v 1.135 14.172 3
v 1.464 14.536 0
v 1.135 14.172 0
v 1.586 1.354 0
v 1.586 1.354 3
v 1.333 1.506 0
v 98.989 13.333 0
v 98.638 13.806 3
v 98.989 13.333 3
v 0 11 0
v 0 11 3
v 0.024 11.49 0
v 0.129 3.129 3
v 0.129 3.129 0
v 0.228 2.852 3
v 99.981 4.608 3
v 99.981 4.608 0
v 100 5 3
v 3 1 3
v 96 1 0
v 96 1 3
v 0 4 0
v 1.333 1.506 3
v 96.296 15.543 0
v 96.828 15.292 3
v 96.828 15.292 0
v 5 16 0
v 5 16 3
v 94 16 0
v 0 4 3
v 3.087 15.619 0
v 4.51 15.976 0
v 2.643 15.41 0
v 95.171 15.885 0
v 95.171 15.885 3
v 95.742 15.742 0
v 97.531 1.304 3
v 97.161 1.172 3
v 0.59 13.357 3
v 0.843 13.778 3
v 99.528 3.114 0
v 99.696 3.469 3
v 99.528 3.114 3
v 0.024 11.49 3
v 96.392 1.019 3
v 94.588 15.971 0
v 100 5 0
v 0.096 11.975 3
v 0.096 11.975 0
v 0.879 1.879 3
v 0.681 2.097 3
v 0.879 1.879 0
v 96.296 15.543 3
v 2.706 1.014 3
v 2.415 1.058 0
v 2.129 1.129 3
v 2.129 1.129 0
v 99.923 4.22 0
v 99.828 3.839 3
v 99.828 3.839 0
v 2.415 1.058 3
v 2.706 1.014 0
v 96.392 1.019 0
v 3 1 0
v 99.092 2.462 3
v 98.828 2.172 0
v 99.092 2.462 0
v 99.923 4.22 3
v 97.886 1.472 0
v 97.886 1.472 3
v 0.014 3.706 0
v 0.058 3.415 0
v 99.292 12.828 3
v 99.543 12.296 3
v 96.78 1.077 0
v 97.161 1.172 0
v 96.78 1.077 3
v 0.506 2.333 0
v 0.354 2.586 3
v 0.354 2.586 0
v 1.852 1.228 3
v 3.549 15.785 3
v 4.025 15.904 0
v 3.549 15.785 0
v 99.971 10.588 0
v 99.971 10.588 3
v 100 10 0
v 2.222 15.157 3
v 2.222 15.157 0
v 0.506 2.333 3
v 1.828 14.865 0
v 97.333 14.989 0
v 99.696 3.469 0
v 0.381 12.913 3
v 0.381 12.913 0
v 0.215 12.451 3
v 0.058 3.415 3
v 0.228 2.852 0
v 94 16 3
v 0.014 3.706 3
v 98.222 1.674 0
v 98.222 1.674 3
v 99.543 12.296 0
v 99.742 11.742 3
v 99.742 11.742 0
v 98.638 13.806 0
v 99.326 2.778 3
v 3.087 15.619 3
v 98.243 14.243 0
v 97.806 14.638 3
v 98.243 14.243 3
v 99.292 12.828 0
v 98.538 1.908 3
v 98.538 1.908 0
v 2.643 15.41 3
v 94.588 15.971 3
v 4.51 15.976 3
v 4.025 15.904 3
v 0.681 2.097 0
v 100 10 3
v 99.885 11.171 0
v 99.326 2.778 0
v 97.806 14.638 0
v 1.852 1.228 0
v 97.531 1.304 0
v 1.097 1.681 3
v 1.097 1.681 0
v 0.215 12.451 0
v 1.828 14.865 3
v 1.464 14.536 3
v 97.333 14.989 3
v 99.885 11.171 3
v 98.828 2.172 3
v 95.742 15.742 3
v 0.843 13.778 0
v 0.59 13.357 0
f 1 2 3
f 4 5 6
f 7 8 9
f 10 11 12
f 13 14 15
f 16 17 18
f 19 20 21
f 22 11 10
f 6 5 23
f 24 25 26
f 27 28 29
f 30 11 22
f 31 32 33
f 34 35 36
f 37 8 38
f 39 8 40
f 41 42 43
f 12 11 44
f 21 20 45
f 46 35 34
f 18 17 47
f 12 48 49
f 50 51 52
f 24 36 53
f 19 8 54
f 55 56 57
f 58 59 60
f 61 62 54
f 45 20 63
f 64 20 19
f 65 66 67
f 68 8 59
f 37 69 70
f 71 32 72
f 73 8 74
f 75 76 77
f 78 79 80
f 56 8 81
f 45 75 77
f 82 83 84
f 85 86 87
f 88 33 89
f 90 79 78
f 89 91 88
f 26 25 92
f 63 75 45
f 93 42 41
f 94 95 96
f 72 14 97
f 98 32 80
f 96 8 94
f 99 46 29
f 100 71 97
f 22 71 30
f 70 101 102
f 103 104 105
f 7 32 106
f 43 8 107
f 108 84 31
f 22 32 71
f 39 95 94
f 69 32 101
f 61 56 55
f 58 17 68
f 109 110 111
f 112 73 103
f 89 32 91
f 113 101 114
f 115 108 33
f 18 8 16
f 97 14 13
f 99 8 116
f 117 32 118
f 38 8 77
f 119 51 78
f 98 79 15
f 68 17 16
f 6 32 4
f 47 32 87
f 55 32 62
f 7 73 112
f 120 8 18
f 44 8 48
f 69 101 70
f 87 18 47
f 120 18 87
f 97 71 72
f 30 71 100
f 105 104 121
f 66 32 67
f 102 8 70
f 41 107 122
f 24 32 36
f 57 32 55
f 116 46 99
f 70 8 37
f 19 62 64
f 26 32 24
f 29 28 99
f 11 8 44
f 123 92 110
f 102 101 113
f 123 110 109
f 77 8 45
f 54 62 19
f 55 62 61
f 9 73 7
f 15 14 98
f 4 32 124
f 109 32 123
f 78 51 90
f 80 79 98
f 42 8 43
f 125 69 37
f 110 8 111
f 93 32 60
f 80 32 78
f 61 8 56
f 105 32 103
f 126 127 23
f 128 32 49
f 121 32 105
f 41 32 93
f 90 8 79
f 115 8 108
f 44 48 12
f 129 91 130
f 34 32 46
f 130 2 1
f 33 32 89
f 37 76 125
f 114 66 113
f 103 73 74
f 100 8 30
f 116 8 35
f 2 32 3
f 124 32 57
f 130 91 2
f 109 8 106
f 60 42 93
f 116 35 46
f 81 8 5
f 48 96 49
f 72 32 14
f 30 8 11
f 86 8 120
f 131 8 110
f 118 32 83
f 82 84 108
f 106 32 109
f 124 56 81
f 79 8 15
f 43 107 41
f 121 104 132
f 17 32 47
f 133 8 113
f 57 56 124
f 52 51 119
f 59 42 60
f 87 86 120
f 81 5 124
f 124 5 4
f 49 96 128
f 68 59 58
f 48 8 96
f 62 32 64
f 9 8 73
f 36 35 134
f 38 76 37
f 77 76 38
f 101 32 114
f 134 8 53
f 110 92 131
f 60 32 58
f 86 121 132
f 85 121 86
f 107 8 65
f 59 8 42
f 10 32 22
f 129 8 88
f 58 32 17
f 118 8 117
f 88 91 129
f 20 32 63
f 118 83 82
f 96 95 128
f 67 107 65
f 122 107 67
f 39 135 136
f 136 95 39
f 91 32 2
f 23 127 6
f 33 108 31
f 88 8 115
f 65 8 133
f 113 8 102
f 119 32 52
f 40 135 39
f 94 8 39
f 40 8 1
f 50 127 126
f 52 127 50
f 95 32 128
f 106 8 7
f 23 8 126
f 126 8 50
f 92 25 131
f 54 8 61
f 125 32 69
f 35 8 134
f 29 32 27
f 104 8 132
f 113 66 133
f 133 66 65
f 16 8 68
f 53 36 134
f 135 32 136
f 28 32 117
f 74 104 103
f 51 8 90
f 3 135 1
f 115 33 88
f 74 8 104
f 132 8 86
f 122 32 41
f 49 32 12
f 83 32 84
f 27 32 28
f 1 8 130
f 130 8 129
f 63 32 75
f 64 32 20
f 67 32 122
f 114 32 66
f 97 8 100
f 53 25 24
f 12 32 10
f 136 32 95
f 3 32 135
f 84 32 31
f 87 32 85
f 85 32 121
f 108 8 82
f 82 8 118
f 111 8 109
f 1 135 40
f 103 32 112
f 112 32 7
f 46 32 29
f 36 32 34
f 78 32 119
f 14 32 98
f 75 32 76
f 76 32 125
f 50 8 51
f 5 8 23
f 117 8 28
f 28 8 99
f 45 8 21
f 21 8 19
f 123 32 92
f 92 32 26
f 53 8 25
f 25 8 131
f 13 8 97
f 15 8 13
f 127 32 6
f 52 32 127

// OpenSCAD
// file: modules/Modules.scad
/*
	This program is free software: you can redistribute it and/or modify
	it under the terms of the GNU General Public License as published by
	the Free Software Foundation, either version 3 of the License, or
	(at your option) any later version.

	This program is distributed in the hope that it will be useful,
	but WITHOUT ANY WARRANTY; without even the implied warranty of
	MERCHANTABILITY or FITNESS FOR A PARTICULAR PURPOSE.  See the
	GNU General Public License for more details.
	
	Purpose:  Hold general use modules for to simplify making of objects
	
	History:	
		01/25/2024	Initial creation
		02/17/2025	Added modules for roundedCube, roundedCylinder
								and FilletedCylinder
		02/23/2025	refactored filletedCylinder to include tapered cylinders
								reference filletedCylinderV1 to see original

*/

/***********************************************************************
****** Module - screwHole
	Create a hole specifically for a screw to go in.
***********************************************************************/
//screwHole();
module screwHole(screwHole=4.5, screwDepth = 10, screwHead = 9, headTaper = 2.3, screwHeadDepth = 5, s=$fn){
	$fn = s;
	// Common size screws
	
    translate([0,0,-headTaper])cylinder(d1=screwHole, d2=screwHead, h = headTaper, $fn=20);
    translate([0,0,-headTaper-screwDepth])cylinder(d=screwHole, h=screwDepth, $fn=10);
    translate([0,0,-headTaper-screwDepth])cylinder(d=screwHole, h=screwDepth, $fn=10);
    translate([0,0,0]) cylinder(d=screwHead, h=screwHeadDepth, $fn=10);
}

/***********************************************************************
****** Module - roundedCube
	4 various ways to make a cube with soft rounded sides.
***********************************************************************/
//roundedCube(x=50, y=30, z=20, r=5, xyz="x");
//roundedCube(x=50, y=30, z=20, r=5, xyz="y");
//roundedCube(x=50, y=30, z=20, r=5, xyz="z");
//roundedCube(x=50, y=30, z=20, r=5, xyz="all");
//roundedCube(x=50, y=30, z=20, r=5, xyz="all", s=60);
//roundedCube(x=50, y=30, z=20, r=5, xyz="all", s=$fn);
module roundedCube(x=50, y=30, z=20, r=5, xyz="z", s=$fn){
	/* variable definitions
			x = value for x axis
			y = value for y axis
			z = value for z axis
			r = radius
			xyz = axis to have the sides rounded
	*/
	$fn = s;
	hull(){
		if (xyz == "z") {
			translate([r,r,0])cylinder(h=z, r=r);
			translate([x-r,r,0])cylinder(h=z, r=r);
			translate([r,y-r,0])cylinder(h=z, r=r);
			translate([x-r,y-r,0])cylinder(h=z, r=r);
		} else if (xyz == "y") {
			translate([r,0,r])rotate([-90,0,0])cylinder(h=y, r=r);
			translate([x-r,0,r])rotate([-90,0,0])cylinder(h=y, r=r);
			translate([r,0,z-r])rotate([-90,0,0])cylinder(h=y, r=r);
			translate([x-r,0,z-r])rotate([-90,0,0])cylinder(h=y, r=r);
		} else if (xyz == "x") {
			translate([0,r,r])rotate([0,90,0])cylinder(h=x, r=r);
			translate([0,y-r,r])rotate([0,90,0])cylinder(h=x, r=r);
			translate([0,r,z-r])rotate([0,90,0])cylinder(h=x, r=r);
			translate([0,y-r,z-r])rotate([0,90,0])cylinder(h=x, r=r);
		} else if (xyz == "all") {
			minkowski(){
				translate([r,r,r])cube([x-r*2,y-r*2,z-r*2]);
				sphere(r=r);
			}			
		} else { 
			echo("XYZ not set");
		}
	}
}

/***********************************************************************
******* Module - roundedCylinder
	Create a cylinder with nice rounded outter top and bottom
***********************************************************************/
//roundedCylinder();
//roundedCylinder(d=200, h=100, r=5);
//roundedCylinder(td=100, bd=100, tr= 10, br = .1);
//difference(){roundedCylinder(d=20, h=10, r=1, s=60);filletedCylinder(d=5, h=10, tr=2, br=1, pad=0, s=30);}
module roundedCylinder(d=200, td=0, bd=0, h=100, r=5, tr=0, br=0, s=$fn){
	$fn = s;

	// Calulate for one or two radises
	tRad = tr > 0 ? tr : r;
	bRad = br > 0 ? br : r;
	//echo(tRad, bRad);

	// Calculate for one diamater or two.
	tDia = td > 0 ? td : d;
	bDia = bd > 0 ? bd : d;
	//echo(tDia, bDia);

	hull(){
		//Bottom
		translate([0,0,bRad])rotate_extrude()translate([bDia/2-bRad,0,0])circle(r=bRad);
		//Top
		translate([0,0,h-tRad])rotate_extrude()translate([tDia/2-tRad,0,0])circle(r=tRad);
	}
}

/***********************************************************************
******* Module - filletedCylinder
	Create a cylinder with flared top and/or bottoms.
	Used for making rounded top/bottom holes in objects.
	Usage:
		d = diamater
		td = top diamater.  d will be used if not provided
		dd = bottom diamater.  d will be used if not provided
		h = height
		r = radius of the fillet
		tr = top radius.  r will be used if not provided
		br = bottom radius.  r will be used if not provided
		pad = filler around the radius  5 is usually good unless very small
		s = smoothing.  generally let $fn of the object do the work.
***********************************************************************/
//filletedCylinder();
//filletedCylinder(d=50, h=100, r=5, pad=5, s=$fn);
//filletedCylinder(d=10, h=20, tr=1, br=1, pad=.1, s=60);
//difference(){roundedCylinder();filletedCylinder();}
//difference(){roundedCylinder(d=200, h=100, r=5);filletedCylinder(d=50, h=100, tr=10, br=5, pad=5);}
//difference(){roundedCylinder(d=20, h=10, r=1, s=30);filletedCylinder(d=5, h=10, tr=2, br=1, pad=0, s=30);}
//filletedCylinder(d=50, td=20, bd=60, h=100, tr=10, br=5, pad=5, s=$fn);
//difference(){roundedCylinder(s=60);filletedCylinder(d=50, td=50, bd=20, h=100, tr=10, br=5, pad=5, s=$fn);}
module filletedCylinder(d=50, td=0, bd=0, h=100, tr=0, br=0, r=5, pad=5, s=$fn){
	$fn = s;
	shift = .1;

	// Calulate for one or two radises
	tRad = tr > 0 ? tr : r;
	bRad = br > 0 ? br : r;
	//echo(tRad, bRad);

	// Calculate for one diamater or two.
	tDia = td > 0 ? td : d;
	bDia = bd > 0 ? bd : d;
	//echo(tDia, bDia);

	// Calculate the shift of the radius in due to angle of a cone
  trShift = tDia > bDia ? tRad * tan(atan(((tDia/2)-(bDia/2))/h)) : 0;
	brShift = bDia > tDia ? bRad * tan(atan(((bDia/2)-(tDia/2))/h)) : 0;
	//echo(trShift, brShift);

	translate([0,0,-shift])cylinder(h=h+shift*2, r1=bDia/2, r2=tDia/2);
	if ( bRad > 0 ){
		// bottom
		translate([0,0,-shift])
			difference(){
				rotate_extrude()translate([bDia/2-pad-brShift,0,0])square([bRad+pad, bRad]);
				rotate_extrude()translate([bDia/2+bRad-brShift,bRad,0])circle(r=bRad);
			}
	}
	if ( tRad > 0 ){
		// top
		translate([0,0,h-tRad+shift])
			difference(){
				rotate_extrude()translate([tDia/2-pad-trShift,0,0])square([tRad+pad, tRad]);
				rotate_extrude()translate([tDia/2+tRad-trShift,0,0])circle(r=tRad);
			}
	}
}

		// v1 kept for reference.  No longer used
		// module filletedCylinderV1(d=50, h=100, tr=10, br=5, pad=5, s=$fn){
		// 	$fn = s;
		// 	shift = .1;
		// 	translate([0,0,-shift])cylinder(h=h+shift*2, r=d/2);
		// 	if ( br > 0 ){
		// 		// bottom
		// 		translate([0,0,-shift])
		// 			difference(){
		// 				rotate_extrude()translate([d/2-pad,0,0])square([br+pad, br]);
		// 				rotate_extrude()translate([d/2+br,br,0])circle(r=br);
		// 			}
		// 	}
		// 	if ( tr > 0 ){
		// 		// top
		// 		translate([0,0,h-tr+shift])
		// 			difference(){
		// 				rotate_extrude()translate([d/2-pad,0,0])square([tr+pad, tr]);
		// 				rotate_extrude()translate([d/2+tr,0,0])circle(r=tr);
		// 			}
		// 	}
		// }

/***********************************************************************
******* Module - CylinderFillet
	Fillet the outter circumfrence of a cylinder.
***********************************************************************/
//difference(){cylinder(h=20, d=100);cylinderFillet(d = 100, r=5);}
/*difference(){
	cylinder(h=20, d=100);
	cylinderFillet(d = 100, r=5);
	translate([0,0,20])rotate([180,0,0])cylinderFillet(d = 100, r=5, s=60);
}*/
module cylinderFillet(d = 100, r=5, s=$fn){
		$fn = s;
		pad = 0.1;	// Padding to maintain manifold
		translate([0,0,0])
		difference() {
				rotate_extrude(convexity=10)
						translate([d/2-r+pad,-pad,0])
								square(r+pad,r+pad);
				#rotate_extrude(convexity=10)
						translate([d/2-r,r,0])
								circle(r=r);
		}
}
// main file
/*
	This program is free software: you can redistribute it and/or modify
	it under the terms of the GNU General Public License as published by
	the Free Software Foundation, either version 3 of the License, or
	(at your option) any later version.

	This program is distributed in the hope that it will be useful,
	but WITHOUT ANY WARRANTY; without even the implied warranty of
	MERCHANTABILITY or FITNESS FOR A PARTICULAR PURPOSE.  See the
	GNU General Public License for more details.
	
	Purpose:  Create nice caulk bead and do it in tight spaces.
	GitHub:		
	
	History:	
		11/10/2025	Initial creation

	Notes:
		- Nothing special see inline notes below

*/

/****** Variables ******************************************************
***********************************************************************/
radius1 = 3;						//
radius2 = 4;						//
radius3 = 5;						//
radius4 = 6;						//
objHeight = 100;
objWidth = 16;
objThick = 3;

// Special variables
$fn = $preview ? 32 : 64;		// 0 is OpenSCAD default

/****** Imports & Includes & Calculations ******************************
***********************************************************************/
include <modules/Modules.scad>

// Global Calculations


/****** The Object *****************************************************
***********************************************************************/
object(objHeight, objWidth, objThick, radius1, radius2, radius3, radius4);

module object(x,y, z, r1, r2, r3, r4){
	// Rendered Calculations
	
	// Start creating the object
	
	hull(){
		translate([r1,r2,0])cylinder(h=z, r=r1);
		translate([x-r2,r3,0])cylinder(h=z, r=r2);
		translate([r3,y-r3,0])cylinder(h=z, r=r3);
		translate([x-r4,y-r4,0])cylinder(h=z, r=r4);
	}
}

/*Some basic commands
translate([0,0,0])
rotate([0,0,0])
cube([0,0,0]);
difference(){}
*/



/****** Batch Export***************************************************
	Use this module to create multiple exports based on rerenderd values
	https://github.com/bbaumg/3DPrinter/blob/master/export.py
	<modules/export.py>
	
	This script searches for "module export()" and individually renders
	and exports each item in it. Each item is expected to be on its own line. 
	The file name will be the comment on the same line, or the module 
	call if no comment exists. All files will be put in a folder with 
	the same name as the scad file it's created from.
***********************************************************************/
module export() {
	//objectExport(x); //<filename.stl>
}

// Calls this to make minor tweaks for batch rendering
//   e.g. rotation of the object for best viewing
module objectExport(var1){
	echo("Rendering Export");
	// Allows for rotation of object for best orientation of STL file
	//    Likely need to rotate 90-180 on z axis.
	rotate([0,0,0])object(var1);
}
